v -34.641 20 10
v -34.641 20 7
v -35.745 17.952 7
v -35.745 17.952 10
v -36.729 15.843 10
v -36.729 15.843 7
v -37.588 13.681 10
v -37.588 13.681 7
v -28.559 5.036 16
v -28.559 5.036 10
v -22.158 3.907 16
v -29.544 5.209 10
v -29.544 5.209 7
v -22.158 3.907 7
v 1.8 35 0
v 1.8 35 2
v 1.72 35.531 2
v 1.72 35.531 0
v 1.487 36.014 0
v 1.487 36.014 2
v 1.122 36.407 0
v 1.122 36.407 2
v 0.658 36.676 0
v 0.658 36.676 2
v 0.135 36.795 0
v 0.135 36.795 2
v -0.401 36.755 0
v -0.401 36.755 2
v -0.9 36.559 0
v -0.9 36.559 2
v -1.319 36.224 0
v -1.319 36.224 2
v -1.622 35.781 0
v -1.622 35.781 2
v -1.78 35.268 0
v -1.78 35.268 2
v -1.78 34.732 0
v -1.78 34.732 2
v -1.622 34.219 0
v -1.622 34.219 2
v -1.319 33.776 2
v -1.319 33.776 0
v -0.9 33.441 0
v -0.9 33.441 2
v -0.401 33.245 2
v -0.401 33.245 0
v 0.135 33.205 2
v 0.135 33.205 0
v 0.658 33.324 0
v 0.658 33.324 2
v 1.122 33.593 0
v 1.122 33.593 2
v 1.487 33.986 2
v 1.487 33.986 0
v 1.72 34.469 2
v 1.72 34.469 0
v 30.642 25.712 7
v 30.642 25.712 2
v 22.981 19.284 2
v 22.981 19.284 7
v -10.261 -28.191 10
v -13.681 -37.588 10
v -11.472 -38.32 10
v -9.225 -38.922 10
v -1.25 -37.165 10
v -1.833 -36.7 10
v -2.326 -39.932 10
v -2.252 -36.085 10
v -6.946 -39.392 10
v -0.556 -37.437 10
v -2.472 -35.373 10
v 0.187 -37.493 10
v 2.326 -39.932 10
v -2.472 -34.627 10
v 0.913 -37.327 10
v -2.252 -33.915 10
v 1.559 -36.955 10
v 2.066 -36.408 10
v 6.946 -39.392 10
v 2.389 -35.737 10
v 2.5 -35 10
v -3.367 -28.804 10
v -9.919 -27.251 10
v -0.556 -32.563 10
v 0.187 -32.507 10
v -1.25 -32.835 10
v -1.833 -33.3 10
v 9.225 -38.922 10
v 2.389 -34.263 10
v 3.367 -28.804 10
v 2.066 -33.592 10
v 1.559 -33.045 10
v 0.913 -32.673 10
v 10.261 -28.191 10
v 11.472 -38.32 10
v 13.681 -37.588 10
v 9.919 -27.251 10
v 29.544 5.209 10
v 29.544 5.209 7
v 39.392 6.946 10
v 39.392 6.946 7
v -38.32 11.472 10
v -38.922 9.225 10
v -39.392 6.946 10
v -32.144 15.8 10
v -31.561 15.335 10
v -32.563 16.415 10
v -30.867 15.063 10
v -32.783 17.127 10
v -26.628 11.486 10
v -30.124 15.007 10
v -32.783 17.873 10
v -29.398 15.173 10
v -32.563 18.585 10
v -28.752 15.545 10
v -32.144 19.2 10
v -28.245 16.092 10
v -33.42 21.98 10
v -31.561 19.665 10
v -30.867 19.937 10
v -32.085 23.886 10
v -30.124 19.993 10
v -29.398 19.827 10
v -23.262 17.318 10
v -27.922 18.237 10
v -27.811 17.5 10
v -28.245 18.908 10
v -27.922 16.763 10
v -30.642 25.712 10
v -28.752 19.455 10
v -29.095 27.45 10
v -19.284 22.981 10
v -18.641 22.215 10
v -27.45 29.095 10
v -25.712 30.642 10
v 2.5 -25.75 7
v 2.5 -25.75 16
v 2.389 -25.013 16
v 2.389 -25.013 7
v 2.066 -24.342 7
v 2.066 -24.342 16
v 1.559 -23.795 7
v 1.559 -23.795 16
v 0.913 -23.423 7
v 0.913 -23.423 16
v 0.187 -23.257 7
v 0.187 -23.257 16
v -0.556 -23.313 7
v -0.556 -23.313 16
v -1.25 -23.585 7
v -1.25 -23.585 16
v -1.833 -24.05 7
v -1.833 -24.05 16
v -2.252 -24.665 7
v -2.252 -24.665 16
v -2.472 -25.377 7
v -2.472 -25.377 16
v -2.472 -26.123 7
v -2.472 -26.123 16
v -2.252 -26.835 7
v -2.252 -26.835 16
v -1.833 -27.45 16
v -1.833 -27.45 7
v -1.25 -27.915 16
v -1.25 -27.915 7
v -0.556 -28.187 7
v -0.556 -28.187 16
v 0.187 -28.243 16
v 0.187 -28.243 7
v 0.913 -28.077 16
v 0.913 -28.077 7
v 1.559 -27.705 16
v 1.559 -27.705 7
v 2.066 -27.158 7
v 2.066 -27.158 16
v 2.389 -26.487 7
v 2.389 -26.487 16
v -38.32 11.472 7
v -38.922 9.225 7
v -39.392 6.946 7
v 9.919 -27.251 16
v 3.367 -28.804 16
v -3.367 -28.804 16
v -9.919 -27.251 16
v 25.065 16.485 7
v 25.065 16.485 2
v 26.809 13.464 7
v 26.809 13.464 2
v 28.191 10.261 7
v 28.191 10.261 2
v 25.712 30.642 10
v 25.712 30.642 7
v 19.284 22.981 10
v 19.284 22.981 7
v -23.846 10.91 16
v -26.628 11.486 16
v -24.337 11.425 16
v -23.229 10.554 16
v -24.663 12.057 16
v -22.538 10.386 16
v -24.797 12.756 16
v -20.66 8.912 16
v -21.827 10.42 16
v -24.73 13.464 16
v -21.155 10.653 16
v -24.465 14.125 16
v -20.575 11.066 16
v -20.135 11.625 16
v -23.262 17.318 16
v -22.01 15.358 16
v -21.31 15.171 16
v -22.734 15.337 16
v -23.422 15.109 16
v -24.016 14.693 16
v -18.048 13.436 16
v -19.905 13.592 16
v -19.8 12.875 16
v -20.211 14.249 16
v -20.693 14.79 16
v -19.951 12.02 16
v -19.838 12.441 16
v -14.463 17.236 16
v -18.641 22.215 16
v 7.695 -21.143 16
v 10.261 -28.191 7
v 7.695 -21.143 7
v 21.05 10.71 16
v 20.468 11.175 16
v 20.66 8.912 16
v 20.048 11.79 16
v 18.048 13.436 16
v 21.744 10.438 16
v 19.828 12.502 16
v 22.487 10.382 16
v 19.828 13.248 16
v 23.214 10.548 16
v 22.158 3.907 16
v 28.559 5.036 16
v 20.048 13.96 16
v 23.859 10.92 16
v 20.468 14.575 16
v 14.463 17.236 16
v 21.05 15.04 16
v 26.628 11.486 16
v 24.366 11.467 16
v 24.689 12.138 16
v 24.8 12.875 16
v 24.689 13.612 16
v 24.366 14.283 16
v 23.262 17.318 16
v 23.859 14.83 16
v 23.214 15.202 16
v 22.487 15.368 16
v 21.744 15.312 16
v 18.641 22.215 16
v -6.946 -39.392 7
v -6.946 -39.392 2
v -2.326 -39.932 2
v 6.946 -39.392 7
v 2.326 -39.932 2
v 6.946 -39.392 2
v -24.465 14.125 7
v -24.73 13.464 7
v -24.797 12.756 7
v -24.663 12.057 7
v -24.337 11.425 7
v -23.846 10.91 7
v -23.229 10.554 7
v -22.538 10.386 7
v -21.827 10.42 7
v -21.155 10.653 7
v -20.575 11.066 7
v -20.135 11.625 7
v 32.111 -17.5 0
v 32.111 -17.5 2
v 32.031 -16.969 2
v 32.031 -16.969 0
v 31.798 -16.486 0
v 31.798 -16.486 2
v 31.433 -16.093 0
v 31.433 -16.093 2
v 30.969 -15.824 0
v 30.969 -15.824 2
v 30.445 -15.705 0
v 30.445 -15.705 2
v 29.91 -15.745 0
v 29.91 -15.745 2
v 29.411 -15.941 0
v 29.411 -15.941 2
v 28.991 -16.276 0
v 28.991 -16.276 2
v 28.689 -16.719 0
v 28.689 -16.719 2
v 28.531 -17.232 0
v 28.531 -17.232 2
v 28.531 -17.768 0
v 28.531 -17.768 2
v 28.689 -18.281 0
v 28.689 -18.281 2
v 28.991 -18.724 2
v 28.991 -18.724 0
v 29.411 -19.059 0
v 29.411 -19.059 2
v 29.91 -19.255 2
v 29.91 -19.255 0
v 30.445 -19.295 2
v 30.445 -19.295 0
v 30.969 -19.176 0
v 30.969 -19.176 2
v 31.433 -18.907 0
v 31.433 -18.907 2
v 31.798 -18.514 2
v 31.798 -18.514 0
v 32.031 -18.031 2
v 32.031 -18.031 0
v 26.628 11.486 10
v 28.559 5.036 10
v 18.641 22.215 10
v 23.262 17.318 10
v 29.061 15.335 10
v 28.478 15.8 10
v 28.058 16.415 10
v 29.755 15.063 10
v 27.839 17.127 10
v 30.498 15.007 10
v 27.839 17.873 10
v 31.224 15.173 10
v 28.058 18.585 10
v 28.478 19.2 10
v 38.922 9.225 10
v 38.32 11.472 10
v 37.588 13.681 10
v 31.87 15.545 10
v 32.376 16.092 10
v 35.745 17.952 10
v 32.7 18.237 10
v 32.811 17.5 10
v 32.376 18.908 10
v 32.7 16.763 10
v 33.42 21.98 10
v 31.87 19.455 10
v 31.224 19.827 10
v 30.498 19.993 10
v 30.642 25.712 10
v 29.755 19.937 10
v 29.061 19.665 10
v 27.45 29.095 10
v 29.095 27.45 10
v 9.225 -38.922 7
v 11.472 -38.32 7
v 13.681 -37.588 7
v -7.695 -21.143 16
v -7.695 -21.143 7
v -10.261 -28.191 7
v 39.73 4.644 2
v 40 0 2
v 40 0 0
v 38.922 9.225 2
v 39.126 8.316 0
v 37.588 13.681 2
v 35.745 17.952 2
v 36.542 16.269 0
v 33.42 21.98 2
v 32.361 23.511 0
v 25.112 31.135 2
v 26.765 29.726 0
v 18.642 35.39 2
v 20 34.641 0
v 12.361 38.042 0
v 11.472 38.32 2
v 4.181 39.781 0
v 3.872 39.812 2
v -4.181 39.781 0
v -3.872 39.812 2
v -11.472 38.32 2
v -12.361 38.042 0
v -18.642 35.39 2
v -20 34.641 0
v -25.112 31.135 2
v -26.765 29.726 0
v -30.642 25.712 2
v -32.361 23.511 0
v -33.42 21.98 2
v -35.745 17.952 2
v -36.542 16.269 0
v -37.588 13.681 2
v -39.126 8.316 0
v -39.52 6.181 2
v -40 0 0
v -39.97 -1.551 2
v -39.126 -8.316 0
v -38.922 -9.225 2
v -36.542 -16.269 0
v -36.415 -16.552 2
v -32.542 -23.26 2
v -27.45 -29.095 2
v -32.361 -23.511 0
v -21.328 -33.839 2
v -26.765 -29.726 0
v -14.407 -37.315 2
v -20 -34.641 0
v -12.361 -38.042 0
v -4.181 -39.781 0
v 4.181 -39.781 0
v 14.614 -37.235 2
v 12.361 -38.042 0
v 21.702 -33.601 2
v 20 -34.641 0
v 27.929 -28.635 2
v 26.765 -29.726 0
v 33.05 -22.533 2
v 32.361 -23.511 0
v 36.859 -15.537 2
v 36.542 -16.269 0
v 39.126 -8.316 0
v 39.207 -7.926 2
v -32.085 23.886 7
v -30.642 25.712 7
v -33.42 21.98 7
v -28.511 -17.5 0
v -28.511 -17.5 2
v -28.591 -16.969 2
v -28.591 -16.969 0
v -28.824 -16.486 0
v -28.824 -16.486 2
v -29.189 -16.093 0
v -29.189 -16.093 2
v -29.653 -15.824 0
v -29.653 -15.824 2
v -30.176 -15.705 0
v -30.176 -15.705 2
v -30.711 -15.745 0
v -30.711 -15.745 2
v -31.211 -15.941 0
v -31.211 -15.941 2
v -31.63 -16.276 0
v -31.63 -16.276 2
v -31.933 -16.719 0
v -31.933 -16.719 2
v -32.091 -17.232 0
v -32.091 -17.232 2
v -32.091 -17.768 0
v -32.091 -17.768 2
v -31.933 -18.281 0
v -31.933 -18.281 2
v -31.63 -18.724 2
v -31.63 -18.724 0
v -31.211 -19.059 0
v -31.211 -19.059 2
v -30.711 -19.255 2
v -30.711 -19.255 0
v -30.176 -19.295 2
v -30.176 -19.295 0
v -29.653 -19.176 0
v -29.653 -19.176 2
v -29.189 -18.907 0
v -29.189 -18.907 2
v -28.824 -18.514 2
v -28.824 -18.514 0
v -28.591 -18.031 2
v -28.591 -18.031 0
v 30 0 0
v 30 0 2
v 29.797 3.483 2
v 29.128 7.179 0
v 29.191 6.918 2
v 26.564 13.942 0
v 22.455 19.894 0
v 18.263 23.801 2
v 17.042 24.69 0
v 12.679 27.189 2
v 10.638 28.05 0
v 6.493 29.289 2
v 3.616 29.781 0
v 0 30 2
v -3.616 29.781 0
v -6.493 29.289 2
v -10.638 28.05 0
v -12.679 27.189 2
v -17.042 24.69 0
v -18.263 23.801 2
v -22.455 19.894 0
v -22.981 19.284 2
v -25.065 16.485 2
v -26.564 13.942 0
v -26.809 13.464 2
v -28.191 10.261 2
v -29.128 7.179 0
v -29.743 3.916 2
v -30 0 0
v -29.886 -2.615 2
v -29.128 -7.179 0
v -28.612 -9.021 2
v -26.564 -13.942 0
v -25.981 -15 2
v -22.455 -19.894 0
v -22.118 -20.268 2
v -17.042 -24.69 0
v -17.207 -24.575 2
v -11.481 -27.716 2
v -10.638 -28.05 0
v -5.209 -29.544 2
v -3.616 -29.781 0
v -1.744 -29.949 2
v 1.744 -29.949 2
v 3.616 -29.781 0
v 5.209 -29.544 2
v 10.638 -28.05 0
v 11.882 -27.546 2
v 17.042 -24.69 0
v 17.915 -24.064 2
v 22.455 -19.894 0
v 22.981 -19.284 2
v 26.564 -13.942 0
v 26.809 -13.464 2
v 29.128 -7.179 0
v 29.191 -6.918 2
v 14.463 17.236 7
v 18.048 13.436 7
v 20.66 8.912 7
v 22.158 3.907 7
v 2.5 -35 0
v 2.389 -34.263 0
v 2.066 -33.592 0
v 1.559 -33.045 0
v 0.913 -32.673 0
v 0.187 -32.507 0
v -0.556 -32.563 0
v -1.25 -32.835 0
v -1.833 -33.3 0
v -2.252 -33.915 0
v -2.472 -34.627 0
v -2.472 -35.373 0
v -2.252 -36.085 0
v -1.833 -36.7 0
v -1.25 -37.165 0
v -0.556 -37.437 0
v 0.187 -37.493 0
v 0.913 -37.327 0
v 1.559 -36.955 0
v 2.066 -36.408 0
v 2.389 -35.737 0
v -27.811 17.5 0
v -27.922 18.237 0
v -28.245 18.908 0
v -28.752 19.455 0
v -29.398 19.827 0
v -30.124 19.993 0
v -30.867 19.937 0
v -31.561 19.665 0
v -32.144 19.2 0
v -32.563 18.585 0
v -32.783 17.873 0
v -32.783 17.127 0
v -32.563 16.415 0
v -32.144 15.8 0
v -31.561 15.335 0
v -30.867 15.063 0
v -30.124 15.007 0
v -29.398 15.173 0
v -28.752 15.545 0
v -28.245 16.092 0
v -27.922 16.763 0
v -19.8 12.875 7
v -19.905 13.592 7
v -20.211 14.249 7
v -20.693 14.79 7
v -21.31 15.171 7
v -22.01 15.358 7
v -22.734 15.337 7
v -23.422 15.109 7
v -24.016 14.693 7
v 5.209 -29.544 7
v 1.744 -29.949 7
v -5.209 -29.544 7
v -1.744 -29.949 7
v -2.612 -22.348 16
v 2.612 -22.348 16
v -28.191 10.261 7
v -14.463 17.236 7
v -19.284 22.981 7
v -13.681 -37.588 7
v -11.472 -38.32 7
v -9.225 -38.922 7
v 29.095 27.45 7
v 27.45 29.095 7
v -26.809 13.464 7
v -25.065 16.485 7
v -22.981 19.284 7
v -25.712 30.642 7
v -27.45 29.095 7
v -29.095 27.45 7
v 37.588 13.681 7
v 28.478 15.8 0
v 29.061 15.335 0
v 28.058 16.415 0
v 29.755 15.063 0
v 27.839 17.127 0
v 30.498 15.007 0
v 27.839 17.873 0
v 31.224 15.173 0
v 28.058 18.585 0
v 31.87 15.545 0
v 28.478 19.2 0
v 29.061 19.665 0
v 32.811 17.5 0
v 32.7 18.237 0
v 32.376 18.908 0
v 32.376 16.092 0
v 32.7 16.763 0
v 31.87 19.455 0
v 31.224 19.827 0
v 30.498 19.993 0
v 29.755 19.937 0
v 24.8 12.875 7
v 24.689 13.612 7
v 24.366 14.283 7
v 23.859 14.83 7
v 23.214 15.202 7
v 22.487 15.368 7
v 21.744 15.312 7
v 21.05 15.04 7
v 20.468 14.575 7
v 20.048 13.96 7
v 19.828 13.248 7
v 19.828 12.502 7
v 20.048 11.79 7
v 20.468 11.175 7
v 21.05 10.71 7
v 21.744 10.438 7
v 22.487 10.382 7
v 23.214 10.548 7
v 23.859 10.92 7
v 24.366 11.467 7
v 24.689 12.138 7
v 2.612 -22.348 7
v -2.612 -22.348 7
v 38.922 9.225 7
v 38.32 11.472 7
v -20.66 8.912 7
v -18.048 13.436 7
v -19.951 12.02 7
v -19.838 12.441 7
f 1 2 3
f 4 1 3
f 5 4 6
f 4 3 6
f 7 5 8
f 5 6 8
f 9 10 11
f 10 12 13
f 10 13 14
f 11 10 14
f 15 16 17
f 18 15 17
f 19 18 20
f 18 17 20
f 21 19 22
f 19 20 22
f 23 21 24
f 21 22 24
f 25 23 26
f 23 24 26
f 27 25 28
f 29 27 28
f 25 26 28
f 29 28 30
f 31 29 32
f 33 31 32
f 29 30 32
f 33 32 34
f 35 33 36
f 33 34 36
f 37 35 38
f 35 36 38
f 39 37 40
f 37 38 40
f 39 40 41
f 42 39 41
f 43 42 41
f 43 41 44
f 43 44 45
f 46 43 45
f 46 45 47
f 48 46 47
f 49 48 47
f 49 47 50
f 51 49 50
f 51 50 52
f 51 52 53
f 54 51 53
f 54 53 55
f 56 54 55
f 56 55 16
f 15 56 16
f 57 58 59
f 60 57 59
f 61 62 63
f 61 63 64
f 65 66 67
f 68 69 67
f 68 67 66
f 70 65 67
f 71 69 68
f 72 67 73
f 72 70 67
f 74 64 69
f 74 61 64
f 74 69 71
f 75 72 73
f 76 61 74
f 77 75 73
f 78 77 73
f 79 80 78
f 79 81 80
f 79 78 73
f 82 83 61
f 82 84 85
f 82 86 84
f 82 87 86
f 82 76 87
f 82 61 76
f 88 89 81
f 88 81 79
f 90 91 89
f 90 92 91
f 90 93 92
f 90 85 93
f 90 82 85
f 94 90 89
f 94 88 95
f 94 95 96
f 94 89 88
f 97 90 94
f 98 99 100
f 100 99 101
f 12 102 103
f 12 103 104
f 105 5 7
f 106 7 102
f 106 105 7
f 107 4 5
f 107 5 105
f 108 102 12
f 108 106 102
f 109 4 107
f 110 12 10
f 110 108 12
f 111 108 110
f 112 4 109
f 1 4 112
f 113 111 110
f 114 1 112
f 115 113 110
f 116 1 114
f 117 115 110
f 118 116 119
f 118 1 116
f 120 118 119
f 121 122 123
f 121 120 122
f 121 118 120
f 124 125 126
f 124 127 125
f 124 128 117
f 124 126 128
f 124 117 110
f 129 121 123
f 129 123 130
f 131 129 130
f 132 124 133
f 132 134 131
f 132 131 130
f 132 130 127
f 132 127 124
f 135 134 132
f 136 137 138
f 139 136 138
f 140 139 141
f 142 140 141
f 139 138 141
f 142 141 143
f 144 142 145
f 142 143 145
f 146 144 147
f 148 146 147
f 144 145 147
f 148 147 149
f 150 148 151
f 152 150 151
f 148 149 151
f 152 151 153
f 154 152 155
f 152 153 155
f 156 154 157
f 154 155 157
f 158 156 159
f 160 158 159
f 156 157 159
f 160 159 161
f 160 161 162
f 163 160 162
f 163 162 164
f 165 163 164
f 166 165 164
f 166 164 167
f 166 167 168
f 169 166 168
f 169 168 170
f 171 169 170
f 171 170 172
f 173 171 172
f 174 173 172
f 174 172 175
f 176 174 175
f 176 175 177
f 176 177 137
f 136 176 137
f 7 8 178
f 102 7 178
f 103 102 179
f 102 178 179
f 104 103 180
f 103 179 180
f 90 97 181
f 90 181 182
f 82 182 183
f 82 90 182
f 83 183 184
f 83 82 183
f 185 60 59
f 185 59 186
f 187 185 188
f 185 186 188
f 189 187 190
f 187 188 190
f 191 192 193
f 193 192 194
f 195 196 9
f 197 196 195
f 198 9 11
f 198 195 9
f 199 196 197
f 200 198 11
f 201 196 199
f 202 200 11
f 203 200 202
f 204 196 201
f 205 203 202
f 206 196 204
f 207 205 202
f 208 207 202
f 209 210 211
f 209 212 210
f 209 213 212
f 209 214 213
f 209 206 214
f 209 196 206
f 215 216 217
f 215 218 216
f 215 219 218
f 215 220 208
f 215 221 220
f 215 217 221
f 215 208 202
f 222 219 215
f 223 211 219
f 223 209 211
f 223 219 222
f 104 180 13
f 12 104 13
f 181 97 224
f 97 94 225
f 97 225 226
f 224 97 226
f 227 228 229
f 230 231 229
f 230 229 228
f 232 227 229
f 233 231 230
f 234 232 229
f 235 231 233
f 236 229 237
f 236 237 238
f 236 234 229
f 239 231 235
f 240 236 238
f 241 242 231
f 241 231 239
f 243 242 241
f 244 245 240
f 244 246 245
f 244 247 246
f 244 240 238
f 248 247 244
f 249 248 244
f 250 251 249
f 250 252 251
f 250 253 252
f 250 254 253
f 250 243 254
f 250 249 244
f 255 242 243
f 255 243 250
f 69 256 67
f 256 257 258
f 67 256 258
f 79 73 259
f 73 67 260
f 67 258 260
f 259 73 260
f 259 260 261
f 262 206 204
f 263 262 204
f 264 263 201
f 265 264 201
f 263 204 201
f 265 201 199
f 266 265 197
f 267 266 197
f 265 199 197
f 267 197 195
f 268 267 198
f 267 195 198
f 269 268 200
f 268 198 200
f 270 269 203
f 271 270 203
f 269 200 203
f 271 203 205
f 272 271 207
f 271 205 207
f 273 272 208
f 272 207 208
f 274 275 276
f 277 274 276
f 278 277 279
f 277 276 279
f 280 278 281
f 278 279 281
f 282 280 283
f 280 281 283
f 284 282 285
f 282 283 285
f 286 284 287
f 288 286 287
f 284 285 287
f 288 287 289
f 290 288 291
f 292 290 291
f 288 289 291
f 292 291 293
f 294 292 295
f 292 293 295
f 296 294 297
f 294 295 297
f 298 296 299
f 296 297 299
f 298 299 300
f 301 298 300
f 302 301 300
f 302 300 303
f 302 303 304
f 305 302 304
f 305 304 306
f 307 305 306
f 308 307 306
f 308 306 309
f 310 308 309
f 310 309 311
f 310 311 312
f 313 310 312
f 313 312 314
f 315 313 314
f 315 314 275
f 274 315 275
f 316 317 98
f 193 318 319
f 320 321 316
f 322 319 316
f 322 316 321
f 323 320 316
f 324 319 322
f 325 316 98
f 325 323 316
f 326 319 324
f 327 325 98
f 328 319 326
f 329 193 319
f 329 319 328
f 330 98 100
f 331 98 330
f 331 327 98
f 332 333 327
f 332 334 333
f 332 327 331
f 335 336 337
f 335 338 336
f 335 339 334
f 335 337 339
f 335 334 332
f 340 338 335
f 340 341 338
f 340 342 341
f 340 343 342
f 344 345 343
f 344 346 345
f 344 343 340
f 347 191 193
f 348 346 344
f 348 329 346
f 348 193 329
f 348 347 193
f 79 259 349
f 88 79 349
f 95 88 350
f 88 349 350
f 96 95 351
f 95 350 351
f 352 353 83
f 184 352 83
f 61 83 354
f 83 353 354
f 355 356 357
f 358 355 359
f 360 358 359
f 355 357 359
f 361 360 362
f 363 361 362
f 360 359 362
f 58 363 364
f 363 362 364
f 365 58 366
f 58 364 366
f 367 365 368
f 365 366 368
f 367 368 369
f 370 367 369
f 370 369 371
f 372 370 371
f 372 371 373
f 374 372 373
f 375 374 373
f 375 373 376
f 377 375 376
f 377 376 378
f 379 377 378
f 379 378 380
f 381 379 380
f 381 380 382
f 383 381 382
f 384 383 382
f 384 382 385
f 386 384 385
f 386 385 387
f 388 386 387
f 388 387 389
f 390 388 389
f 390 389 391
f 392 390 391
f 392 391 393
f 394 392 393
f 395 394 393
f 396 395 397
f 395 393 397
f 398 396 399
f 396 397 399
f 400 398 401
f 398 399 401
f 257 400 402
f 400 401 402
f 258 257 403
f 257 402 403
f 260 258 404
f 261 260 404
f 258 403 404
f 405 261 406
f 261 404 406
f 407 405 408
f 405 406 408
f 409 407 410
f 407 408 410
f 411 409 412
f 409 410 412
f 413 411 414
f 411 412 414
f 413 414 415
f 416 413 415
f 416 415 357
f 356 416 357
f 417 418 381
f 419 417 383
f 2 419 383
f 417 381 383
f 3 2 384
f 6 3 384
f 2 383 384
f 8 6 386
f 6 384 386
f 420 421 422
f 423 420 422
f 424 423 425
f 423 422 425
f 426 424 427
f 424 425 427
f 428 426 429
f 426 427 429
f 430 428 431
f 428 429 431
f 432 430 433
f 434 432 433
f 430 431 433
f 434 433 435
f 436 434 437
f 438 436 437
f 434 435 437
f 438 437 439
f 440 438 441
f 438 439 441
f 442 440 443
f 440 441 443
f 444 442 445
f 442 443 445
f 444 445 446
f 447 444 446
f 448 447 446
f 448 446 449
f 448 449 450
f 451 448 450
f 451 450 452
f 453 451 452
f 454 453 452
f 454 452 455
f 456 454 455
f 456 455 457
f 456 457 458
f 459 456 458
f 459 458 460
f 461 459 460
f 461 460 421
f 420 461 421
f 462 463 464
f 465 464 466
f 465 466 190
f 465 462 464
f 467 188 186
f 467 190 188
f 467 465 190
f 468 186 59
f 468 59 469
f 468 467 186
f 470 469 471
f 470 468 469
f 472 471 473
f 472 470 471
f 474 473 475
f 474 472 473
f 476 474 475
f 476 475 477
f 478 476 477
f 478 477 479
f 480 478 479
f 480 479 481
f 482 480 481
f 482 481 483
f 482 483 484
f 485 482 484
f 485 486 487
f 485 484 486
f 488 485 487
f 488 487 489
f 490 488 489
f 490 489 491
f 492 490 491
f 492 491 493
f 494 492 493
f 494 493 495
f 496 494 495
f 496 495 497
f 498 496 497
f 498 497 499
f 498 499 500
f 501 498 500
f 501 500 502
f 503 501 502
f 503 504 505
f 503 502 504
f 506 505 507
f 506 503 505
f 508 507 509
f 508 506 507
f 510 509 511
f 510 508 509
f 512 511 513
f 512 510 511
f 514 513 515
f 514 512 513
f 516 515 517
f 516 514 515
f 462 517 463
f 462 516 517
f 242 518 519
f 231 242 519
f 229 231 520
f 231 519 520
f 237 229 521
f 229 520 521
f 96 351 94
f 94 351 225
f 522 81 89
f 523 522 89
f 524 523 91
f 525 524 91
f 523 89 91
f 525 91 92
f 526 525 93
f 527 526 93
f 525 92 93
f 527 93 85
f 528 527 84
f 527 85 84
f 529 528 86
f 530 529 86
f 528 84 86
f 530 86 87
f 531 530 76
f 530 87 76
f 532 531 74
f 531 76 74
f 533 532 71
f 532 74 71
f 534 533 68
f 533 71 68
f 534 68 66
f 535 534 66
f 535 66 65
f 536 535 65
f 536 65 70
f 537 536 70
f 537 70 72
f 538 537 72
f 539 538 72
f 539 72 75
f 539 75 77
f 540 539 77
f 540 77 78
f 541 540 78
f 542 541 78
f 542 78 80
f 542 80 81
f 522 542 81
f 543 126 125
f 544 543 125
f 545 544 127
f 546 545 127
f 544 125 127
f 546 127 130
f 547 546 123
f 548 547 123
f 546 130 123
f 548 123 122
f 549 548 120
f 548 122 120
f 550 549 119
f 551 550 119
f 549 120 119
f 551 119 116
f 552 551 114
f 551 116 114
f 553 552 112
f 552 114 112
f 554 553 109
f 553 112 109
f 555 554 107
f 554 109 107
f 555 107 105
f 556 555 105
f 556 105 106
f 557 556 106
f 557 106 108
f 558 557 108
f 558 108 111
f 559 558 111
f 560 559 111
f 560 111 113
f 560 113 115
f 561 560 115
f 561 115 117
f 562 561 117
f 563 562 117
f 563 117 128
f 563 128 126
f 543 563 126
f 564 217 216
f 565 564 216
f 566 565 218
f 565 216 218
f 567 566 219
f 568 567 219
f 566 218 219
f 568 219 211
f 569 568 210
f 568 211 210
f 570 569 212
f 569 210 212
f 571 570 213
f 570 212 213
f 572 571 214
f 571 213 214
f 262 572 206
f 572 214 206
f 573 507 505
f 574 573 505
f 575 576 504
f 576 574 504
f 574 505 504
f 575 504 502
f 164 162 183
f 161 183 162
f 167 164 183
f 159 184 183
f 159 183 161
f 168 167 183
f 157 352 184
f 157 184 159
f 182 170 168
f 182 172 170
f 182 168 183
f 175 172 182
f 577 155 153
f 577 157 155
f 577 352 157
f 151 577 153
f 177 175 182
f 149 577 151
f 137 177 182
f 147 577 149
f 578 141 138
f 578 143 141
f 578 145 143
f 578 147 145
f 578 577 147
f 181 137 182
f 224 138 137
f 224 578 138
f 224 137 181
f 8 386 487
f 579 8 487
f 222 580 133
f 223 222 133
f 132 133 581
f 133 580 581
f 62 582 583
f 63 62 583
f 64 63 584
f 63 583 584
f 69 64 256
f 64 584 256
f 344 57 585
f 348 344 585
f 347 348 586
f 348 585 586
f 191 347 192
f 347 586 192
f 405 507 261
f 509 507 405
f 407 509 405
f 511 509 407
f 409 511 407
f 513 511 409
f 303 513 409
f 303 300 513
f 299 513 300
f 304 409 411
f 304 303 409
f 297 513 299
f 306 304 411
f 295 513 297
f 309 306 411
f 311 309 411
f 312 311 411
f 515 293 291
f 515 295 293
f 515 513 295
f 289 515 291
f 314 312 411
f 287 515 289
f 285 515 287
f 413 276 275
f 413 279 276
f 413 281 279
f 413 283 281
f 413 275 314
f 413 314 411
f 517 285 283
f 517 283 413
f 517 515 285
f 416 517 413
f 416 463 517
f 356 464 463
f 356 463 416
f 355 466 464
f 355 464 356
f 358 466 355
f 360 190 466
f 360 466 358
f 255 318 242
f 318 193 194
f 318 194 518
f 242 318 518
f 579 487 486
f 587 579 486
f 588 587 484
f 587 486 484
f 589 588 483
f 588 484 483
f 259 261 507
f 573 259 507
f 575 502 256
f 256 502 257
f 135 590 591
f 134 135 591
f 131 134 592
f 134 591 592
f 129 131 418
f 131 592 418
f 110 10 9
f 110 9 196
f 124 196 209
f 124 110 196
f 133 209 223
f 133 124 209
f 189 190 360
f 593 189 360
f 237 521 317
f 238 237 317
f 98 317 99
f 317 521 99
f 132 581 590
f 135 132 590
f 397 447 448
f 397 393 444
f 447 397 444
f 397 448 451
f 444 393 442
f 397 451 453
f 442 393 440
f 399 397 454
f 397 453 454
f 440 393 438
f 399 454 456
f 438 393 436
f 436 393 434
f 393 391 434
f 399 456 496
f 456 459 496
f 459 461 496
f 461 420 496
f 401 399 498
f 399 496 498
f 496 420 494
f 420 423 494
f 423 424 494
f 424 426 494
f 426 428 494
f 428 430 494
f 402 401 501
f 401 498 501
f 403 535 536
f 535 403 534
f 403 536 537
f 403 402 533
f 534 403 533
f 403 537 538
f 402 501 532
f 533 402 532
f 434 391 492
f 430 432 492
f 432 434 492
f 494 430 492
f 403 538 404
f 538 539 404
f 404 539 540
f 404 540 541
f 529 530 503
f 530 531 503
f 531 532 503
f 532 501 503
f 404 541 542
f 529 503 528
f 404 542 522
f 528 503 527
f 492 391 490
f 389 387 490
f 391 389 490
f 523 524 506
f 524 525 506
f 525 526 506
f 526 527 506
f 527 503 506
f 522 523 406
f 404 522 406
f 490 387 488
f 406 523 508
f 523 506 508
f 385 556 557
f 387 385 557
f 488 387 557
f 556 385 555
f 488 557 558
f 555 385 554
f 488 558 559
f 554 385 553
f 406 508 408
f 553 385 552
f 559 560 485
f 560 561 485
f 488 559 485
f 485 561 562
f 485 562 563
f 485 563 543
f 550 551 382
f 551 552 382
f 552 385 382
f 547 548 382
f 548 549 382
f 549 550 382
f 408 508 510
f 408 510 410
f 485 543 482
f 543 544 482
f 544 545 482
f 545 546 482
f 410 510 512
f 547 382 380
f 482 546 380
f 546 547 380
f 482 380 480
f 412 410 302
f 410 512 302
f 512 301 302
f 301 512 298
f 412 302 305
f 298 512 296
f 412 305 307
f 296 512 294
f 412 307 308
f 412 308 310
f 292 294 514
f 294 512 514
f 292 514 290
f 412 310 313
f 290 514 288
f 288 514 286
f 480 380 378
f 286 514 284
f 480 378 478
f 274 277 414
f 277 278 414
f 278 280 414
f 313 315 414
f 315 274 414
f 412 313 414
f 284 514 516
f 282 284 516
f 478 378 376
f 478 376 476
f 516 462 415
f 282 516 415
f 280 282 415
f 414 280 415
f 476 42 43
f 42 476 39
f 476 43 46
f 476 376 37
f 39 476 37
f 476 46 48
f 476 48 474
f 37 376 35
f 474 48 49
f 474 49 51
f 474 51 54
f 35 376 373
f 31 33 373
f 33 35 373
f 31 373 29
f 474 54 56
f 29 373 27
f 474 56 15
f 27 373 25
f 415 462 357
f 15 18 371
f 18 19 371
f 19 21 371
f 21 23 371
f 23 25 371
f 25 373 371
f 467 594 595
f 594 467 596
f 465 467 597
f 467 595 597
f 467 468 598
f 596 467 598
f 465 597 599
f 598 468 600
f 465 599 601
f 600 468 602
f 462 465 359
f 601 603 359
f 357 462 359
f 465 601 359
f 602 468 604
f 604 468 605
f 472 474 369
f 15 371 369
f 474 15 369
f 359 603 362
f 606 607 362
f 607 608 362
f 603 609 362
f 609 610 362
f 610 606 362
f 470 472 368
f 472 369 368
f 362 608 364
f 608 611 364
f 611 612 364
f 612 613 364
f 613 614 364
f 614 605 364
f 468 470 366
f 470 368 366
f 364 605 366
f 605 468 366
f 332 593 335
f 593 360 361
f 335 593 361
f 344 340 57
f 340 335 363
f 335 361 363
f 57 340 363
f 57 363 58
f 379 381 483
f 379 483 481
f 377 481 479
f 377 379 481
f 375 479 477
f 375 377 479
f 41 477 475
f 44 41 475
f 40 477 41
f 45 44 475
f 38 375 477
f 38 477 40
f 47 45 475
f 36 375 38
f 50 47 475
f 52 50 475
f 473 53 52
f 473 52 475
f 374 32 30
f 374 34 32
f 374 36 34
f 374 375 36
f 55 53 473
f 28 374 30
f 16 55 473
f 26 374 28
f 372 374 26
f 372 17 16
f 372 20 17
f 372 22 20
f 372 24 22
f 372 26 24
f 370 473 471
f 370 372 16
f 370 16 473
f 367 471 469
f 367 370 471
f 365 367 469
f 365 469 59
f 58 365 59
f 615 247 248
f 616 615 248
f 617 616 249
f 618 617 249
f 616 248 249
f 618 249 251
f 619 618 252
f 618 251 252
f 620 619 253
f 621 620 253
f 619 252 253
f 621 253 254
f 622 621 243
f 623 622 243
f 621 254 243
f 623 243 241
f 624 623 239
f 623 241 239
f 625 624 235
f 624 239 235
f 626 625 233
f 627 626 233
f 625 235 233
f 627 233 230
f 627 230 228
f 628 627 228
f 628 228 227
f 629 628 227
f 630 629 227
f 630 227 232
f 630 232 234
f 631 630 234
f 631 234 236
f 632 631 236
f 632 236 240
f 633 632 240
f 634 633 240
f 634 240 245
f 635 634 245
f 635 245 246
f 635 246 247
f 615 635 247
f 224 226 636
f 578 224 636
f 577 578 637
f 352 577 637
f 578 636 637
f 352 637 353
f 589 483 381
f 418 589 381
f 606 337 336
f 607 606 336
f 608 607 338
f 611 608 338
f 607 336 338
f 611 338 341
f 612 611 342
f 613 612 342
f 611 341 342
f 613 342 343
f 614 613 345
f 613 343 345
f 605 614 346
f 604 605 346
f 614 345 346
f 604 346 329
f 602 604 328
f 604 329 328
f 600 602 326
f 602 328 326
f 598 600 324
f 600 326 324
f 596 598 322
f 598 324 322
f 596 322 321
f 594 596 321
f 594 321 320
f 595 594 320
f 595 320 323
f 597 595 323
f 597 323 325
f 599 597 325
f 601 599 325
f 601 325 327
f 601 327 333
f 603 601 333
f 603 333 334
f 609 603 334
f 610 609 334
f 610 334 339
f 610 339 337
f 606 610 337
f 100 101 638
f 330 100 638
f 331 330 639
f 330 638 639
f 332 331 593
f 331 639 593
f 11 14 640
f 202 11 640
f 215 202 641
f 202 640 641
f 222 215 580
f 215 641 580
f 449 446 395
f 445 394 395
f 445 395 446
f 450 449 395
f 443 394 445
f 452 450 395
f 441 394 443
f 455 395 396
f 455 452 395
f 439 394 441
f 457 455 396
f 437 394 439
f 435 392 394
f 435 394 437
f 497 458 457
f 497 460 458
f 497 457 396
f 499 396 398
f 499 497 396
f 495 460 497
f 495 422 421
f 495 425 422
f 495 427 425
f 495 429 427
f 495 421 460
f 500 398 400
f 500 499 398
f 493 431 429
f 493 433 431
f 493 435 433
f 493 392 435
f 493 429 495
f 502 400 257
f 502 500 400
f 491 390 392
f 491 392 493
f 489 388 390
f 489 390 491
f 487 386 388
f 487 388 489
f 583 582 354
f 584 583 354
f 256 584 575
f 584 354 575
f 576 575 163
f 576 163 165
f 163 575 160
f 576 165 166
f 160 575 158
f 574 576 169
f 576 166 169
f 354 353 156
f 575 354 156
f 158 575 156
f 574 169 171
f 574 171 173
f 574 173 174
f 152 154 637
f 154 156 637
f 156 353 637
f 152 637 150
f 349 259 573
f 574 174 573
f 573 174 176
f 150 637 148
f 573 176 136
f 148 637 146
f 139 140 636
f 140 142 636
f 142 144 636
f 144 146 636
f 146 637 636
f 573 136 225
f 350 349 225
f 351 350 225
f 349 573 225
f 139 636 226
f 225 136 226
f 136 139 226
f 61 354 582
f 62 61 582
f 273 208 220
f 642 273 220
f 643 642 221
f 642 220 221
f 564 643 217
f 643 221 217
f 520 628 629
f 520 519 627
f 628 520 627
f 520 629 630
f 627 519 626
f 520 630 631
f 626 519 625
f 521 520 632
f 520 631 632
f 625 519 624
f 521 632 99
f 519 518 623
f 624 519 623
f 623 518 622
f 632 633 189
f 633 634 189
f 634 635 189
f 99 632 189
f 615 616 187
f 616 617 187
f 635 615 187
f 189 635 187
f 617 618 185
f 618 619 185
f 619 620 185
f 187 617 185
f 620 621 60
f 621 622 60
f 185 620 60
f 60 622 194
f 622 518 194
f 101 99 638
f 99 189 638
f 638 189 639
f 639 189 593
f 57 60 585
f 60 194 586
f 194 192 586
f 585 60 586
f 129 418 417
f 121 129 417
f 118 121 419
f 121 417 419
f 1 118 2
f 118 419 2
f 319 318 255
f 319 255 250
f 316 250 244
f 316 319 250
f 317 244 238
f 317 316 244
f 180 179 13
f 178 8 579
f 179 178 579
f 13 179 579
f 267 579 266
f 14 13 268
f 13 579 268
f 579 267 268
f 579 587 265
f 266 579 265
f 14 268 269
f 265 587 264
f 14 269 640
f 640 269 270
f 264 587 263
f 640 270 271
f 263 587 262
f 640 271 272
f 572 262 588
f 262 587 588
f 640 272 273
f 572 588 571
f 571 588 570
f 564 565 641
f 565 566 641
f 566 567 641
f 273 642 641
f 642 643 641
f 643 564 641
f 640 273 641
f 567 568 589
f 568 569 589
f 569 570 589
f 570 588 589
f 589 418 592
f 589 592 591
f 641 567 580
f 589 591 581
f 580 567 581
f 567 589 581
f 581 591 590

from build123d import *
from build123d.topology import SkipClean

# Parameters (mm, degrees)
SKETCH_1_R          = 40
SKETCH_1_R_2        = 30
EXTRUDE_1_DEPTH     = 2
CUT_EXTRUDE_1_REACH = 58.604
SKETCH_2_R          = 1.8
EXTRUDE_3_DEPTH     = 5
EXTRUDE_4_DEPTH     = 3
CUT_EXTRUDE_2_REACH = 59.446
SKETCH_5_R          = 2.5
EXTRUDE_START       = -3
EXTRUDE_5_DEPTH     = 9
CUT_EXTRUDE_START   = -6
CUT_EXTRUDE_3_DEPTH = 6
CUT_EXTRUDE_4_REACH = 60.788
SKETCH_8_R          = 2.5


with BuildPart() as part:
    # 草图1 → 凸台-拉伸1 (new body)
    with BuildSketch(Plane.XY):
        Circle(SKETCH_1_R)
        Circle(SKETCH_1_R_2, mode=Mode.SUBTRACT)
    extrude(amount=EXTRUDE_1_DEPTH)

    # 草图2 → 切除-拉伸1 (cut, up to next)
    with BuildSketch(Plane.XY.offset(2), mode=Mode.PRIVATE) as cut_extrude_1_sk1:
        with Locations((0, 35)):
            Circle(SKETCH_2_R)
    cut_extrude_1_tool1 = extrude(cut_extrude_1_sk1.sketch, amount=-CUT_EXTRUDE_1_REACH, mode=Mode.PRIVATE) & part.part
    # 草图2 → 切除-拉伸1 (cut, up to next)
    with BuildSketch(Plane.XY.offset(2), mode=Mode.PRIVATE) as cut_extrude_1_sk2:
        with Locations((30.310889132, -17.5)):
            Circle(SKETCH_2_R)
    cut_extrude_1_tool2 = extrude(cut_extrude_1_sk2.sketch, amount=-CUT_EXTRUDE_1_REACH, mode=Mode.PRIVATE) & part.part
    # 草图2 → 切除-拉伸1 (cut, up to next)
    with BuildSketch(Plane.XY.offset(2), mode=Mode.PRIVATE) as cut_extrude_1_sk3:
        with Locations((-30.310889132, -17.5)):
            Circle(SKETCH_2_R)
    cut_extrude_1_tool3 = extrude(cut_extrude_1_sk3.sketch, amount=-CUT_EXTRUDE_1_REACH, mode=Mode.PRIVATE) & part.part
    add(cut_extrude_1_tool1.solids().sort_by_distance((0, 35, 2))[0], mode=Mode.SUBTRACT)
    add(cut_extrude_1_tool2.solids().sort_by_distance((30.310889, -17.5, 2))[0], mode=Mode.SUBTRACT)
    add(cut_extrude_1_tool3.solids().sort_by_distance((-30.310889, -17.5, 2))[0], mode=Mode.SUBTRACT)

    # 草图3 → 凸台-拉伸3 (add)
    with BuildSketch(Plane.XY.offset(2)):
        with BuildLine():
            Line((30.641777725, 25.711504387), (22.981333294, 19.283628291))
            ThreePointArc((22.981333294, 19.283628291), (25.980762114, 15), (28.190778624, 10.2606043))
            Line((28.190778624, 10.2606043), (37.587704831, 13.680805733))
            ThreePointArc((37.587704831, 13.680805733), (34.641016151, 20), (30.641777725, 25.711504387))
        make_face()
        with BuildLine():
            ThreePointArc((-28.190778624, 10.2606043), (-25.980762114, 15), (-22.981333294, 19.283628291))
            Line((-22.981333294, 19.283628291), (-30.641777725, 25.711504387))
            ThreePointArc((-30.641777725, 25.711504387), (-34.641016151, 20), (-37.587704831, 13.680805733))
            Line((-37.587704831, 13.680805733), (-28.190778624, 10.2606043))
        make_face()
        with BuildLine():
            Line((6.945927107, -39.39231012), (5.20944533, -29.54423259))
            ThreePointArc((5.20944533, -29.54423259), (0, -30), (-5.20944533, -29.54423259))
            Line((-5.20944533, -29.54423259), (-6.945927107, -39.39231012))
            ThreePointArc((-6.945927107, -39.39231012), (0, -40), (6.945927107, -39.39231012))
        make_face()
    extrude(amount=EXTRUDE_3_DEPTH)

    # 草图4 → 凸台-拉伸4 (add)
    with BuildSketch(Plane.XY.offset(7)):
        with BuildLine():
            ThreePointArc((-22.981333294, 19.283628291), (-21.213203436, 21.213203436), (-19.283628291, 22.981333294))
            Line((-19.283628291, 22.981333294), (-25.711504387, 30.641777725))
            ThreePointArc((-25.711504387, 30.641777725), (-28.284271247, 28.284271247), (-30.641777725, 25.711504387))
            Line((-30.641777725, 25.711504387), (-22.981333294, 19.283628291))
        make_face()
        with BuildLine():
            ThreePointArc((-25.980762114, 15), (-24.574561329, 17.207293091), (-22.981333294, 19.283628291))
            Line((-22.981333294, 19.283628291), (-30.641777725, 25.711504387))
            ThreePointArc((-30.641777725, 25.711504387), (-32.766081772, 22.943057454), (-34.641016151, 20))
            Line((-34.641016151, 20), (-25.980762114, 15))
        make_face()
        with BuildLine():
            ThreePointArc((-28.190778624, 10.2606043), (-27.189233611, 12.678547852), (-25.980762114, 15))
            Line((-25.980762114, 15), (-34.641016151, 20))
            ThreePointArc((-34.641016151, 20), (-36.252311481, 16.90473047), (-37.587704831, 13.680805733))
            Line((-37.587704831, 13.680805733), (-28.190778624, 10.2606043))
        make_face()
        with BuildLine():
            ThreePointArc((-29.54423259, 5.20944533), (-28.977774789, 7.764571353), (-28.190778624, 10.2606043))
            Line((-28.190778624, 10.2606043), (-37.587704831, 13.680805733))
            ThreePointArc((-37.587704831, 13.680805733), (-38.637033052, 10.352761804), (-39.39231012, 6.945927107))
            Line((-39.39231012, 6.945927107), (-29.54423259, 5.20944533))
        make_face()
        with BuildLine():
            Line((25.711504387, 30.641777725), (19.283628291, 22.981333294))
            ThreePointArc((19.283628291, 22.981333294), (21.213203436, 21.213203436), (22.981333294, 19.283628291))
            ThreePointArc((22.981333294, 19.283628291), (25.980762114, 15), (28.190778624, 10.2606043))
            ThreePointArc((28.190778624, 10.2606043), (28.977774789, 7.764571353), (29.54423259, 5.20944533))
            Line((29.54423259, 5.20944533), (39.39231012, 6.945927107))
            ThreePointArc((39.39231012, 6.945927107), (38.637033052, 10.352761804), (37.587704831, 13.680805733))
            ThreePointArc((37.587704831, 13.680805733), (34.641016151, 20), (30.641777725, 25.711504387))
            ThreePointArc((30.641777725, 25.711504387), (28.284271247, 28.284271247), (25.711504387, 30.641777725))
        make_face()
        with BuildLine():
            ThreePointArc((-5.20944533, -29.54423259), (-7.764571353, -28.977774789), (-10.2606043, -28.190778624))
            Line((-10.2606043, -28.190778624), (-13.680805733, -37.587704831))
            ThreePointArc((-13.680805733, -37.587704831), (-10.352761804, -38.637033052), (-6.945927107, -39.39231012))
            ThreePointArc((-6.945927107, -39.39231012), (0, -40), (6.945927107, -39.39231012))
            ThreePointArc((6.945927107, -39.39231012), (10.352761804, -38.637033052), (13.680805733, -37.587704831))
            Line((13.680805733, -37.587704831), (10.2606043, -28.190778624))
            ThreePointArc((10.2606043, -28.190778624), (7.764571353, -28.977774789), (5.20944533, -29.54423259))
            ThreePointArc((5.20944533, -29.54423259), (0, -30), (-5.20944533, -29.54423259))
        make_face()
    extrude(amount=EXTRUDE_4_DEPTH)

    # 草图5 → 切除-拉伸2 (cut, up to next)
    with BuildSketch(Plane.XY.offset(10), mode=Mode.PRIVATE) as cut_extrude_2_sk1:
        with Locations((-30.310889132, 17.5)):
            Circle(SKETCH_5_R)
    cut_extrude_2_tool1 = extrude(cut_extrude_2_sk1.sketch, amount=-CUT_EXTRUDE_2_REACH, mode=Mode.PRIVATE) & part.part
    # 草图5 → 切除-拉伸2 (cut, up to next)
    with BuildSketch(Plane.XY.offset(10), mode=Mode.PRIVATE) as cut_extrude_2_sk2:
        with Locations((30.310889132, 17.5)):
            Circle(SKETCH_5_R)
    cut_extrude_2_tool2 = extrude(cut_extrude_2_sk2.sketch, amount=-CUT_EXTRUDE_2_REACH, mode=Mode.PRIVATE) & part.part
    # 草图5 → 切除-拉伸2 (cut, up to next)
    with BuildSketch(Plane.XY.offset(10), mode=Mode.PRIVATE) as cut_extrude_2_sk3:
        with Locations((0, -35)):
            Circle(SKETCH_5_R)
    cut_extrude_2_tool3 = extrude(cut_extrude_2_sk3.sketch, amount=-CUT_EXTRUDE_2_REACH, mode=Mode.PRIVATE) & part.part
    add(cut_extrude_2_tool1.solids().sort_by_distance((-30.310889, 17.5, 10))[0], mode=Mode.SUBTRACT)
    add(cut_extrude_2_tool2.solids().sort_by_distance((30.310889, 17.5, 10))[0], mode=Mode.SUBTRACT)
    add(cut_extrude_2_tool3.solids().sort_by_distance((0, -35, 10))[0], mode=Mode.SUBTRACT)

    # 草图6 → 凸台-拉伸5 (add)
    with SkipClean():  # the faces are left unmerged after this step: merging them gives an invalid solid
        with BuildSketch(Plane.XY.offset(10).offset(EXTRUDE_START)):
            with BuildLine():
                Line((-14.462721218, 17.23599997), (-19.283628291, 22.981333294))
                ThreePointArc((-19.283628291, 22.981333294), (-25.980762114, 15), (-29.54423259, 5.20944533))
                Line((-29.54423259, 5.20944533), (-22.158174443, 3.907083998))
                ThreePointArc((-22.158174443, 3.907083998), (-19.485571585, 11.25), (-14.462721218, 17.23599997))
            make_face()
            with BuildLine():
                Line((22.158174443, 3.907083998), (29.54423259, 5.20944533))
                ThreePointArc((29.54423259, 5.20944533), (25.980762114, 15), (19.283628291, 22.981333294))
                Line((19.283628291, 22.981333294), (14.462721218, 17.23599997))
                ThreePointArc((14.462721218, 17.23599997), (19.485571585, 11.25), (22.158174443, 3.907083998))
            make_face()
            with BuildLine():
                Line((-7.695453225, -21.143083968), (-10.2606043, -28.190778624))
                ThreePointArc((-10.2606043, -28.190778624), (0, -30), (10.2606043, -28.190778624))
                Line((10.2606043, -28.190778624), (7.695453225, -21.143083968))
                ThreePointArc((7.695453225, -21.143083968), (0, -22.5), (-7.695453225, -21.143083968))
            make_face()
        extrude(amount=EXTRUDE_5_DEPTH)

    # 草图7 → 切除-拉伸3 (cut)
    with SkipClean():  # the faces are left unmerged after this step: merging them gives an invalid solid
        with BuildSketch(Plane.XY.offset(16).offset(CUT_EXTRUDE_START)):
            with BuildLine():
                Line((-29.54423259, 5.20944533), (-28.559424837, 5.035797152))
                ThreePointArc((-28.559424837, 5.035797152), (-25.11473671, 14.5), (-18.640840681, 22.21528885))
                Line((-18.640840681, 22.21528885), (-19.283628291, 22.981333294))
                ThreePointArc((-19.283628291, 22.981333294), (-25.980762114, 15), (-29.54423259, 5.20944533))
            make_face()
            with BuildLine():
                ThreePointArc((18.640840681, 22.21528885), (25.11473671, 14.5), (28.559424837, 5.035797152))
                Line((28.559424837, 5.035797152), (29.54423259, 5.20944533))
                ThreePointArc((29.54423259, 5.20944533), (25.980762114, 15), (19.283628291, 22.981333294))
                Line((19.283628291, 22.981333294), (18.640840681, 22.21528885))
            make_face()
            with BuildLine():
                ThreePointArc((-10.2606043, -28.190778624), (0, -30), (10.2606043, -28.190778624))
                Line((10.2606043, -28.190778624), (9.918584156, -27.251086003))
                ThreePointArc((9.918584156, -27.251086003), (0, -29), (-9.918584156, -27.251086003))
                Line((-9.918584156, -27.251086003), (-10.2606043, -28.190778624))
            make_face()
        extrude(amount=CUT_EXTRUDE_3_DEPTH, mode=Mode.SUBTRACT)

    # 草图8 → 切除-拉伸4 (cut, up to next)
    with BuildSketch(Plane.XY.offset(16), mode=Mode.PRIVATE) as cut_extrude_4_sk1:
        with Locations((0, -25.75)):
            Circle(SKETCH_8_R)
    cut_extrude_4_tool1 = extrude(cut_extrude_4_sk1.sketch, amount=-CUT_EXTRUDE_4_REACH, mode=Mode.PRIVATE) & part.part
    # 草图8 → 切除-拉伸4 (cut, up to next)
    with BuildSketch(Plane.XY.offset(16), mode=Mode.PRIVATE) as cut_extrude_4_sk2:
        with Locations((22.300154147, 12.875)):
            Circle(SKETCH_8_R)
    cut_extrude_4_tool2 = extrude(cut_extrude_4_sk2.sketch, amount=-CUT_EXTRUDE_4_REACH, mode=Mode.PRIVATE) & part.part
    # 草图8 → 切除-拉伸4 (cut, up to next)
    with BuildSketch(Plane.XY.offset(16), mode=Mode.PRIVATE) as cut_extrude_4_sk3:
        with BuildLine():
            ThreePointArc((-24.465217657, 14.125), (-23.550154147, 10.709936491), (-20.135090638, 11.625))
            Line((-20.135090638, 11.625), (-24.465217657, 14.125))
        make_face()
    cut_extrude_4_tool3 = extrude(cut_extrude_4_sk3.sketch, amount=-CUT_EXTRUDE_4_REACH, mode=Mode.PRIVATE) & part.part
    # 草图8 → 切除-拉伸4 (cut, up to next)
    with BuildSketch(Plane.XY.offset(16), mode=Mode.PRIVATE) as cut_extrude_4_sk4:
        with BuildLine():
            Line((-24.465217657, 14.125), (-20.135090638, 11.625))
            ThreePointArc((-20.135090638, 11.625), (-19.885339582, 12.227952387), (-19.800154147, 12.875))
            ThreePointArc((-19.800154147, 12.875), (-21.653106535, 15.289814566), (-24.465217657, 14.125))
        make_face()
    cut_extrude_4_tool4 = extrude(cut_extrude_4_sk4.sketch, amount=-CUT_EXTRUDE_4_REACH, mode=Mode.PRIVATE) & part.part
    # 草图8 → 切除-拉伸4 (cut, up to next)
    with BuildSketch(Plane.XY.offset(16), mode=Mode.PRIVATE) as cut_extrude_4_sk5:
        with BuildLine():
            ThreePointArc((-24.465217657, 14.125), (-23.550154147, 10.709936491), (-20.135090638, 11.625))
            Line((-20.135090638, 11.625), (-24.465217657, 14.125))
        make_face()
    cut_extrude_4_tool5 = extrude(cut_extrude_4_sk5.sketch, amount=-CUT_EXTRUDE_4_REACH, mode=Mode.PRIVATE) & part.part
    # 草图8 → 切除-拉伸4 (cut, up to next)
    with BuildSketch(Plane.XY.offset(16), mode=Mode.PRIVATE) as cut_extrude_4_sk6:
        with BuildLine():
            Line((-24.465217657, 14.125), (-20.135090638, 11.625))
            ThreePointArc((-20.135090638, 11.625), (-19.885339582, 12.227952387), (-19.800154147, 12.875))
            ThreePointArc((-19.800154147, 12.875), (-21.653106535, 15.289814566), (-24.465217657, 14.125))
        make_face()
    cut_extrude_4_tool6 = extrude(cut_extrude_4_sk6.sketch, amount=-CUT_EXTRUDE_4_REACH, mode=Mode.PRIVATE) & part.part
    add(cut_extrude_4_tool1.solids().sort_by_distance((0, -25.75, 16))[0], mode=Mode.SUBTRACT)
    add(cut_extrude_4_tool2.solids().sort_by_distance((22.300154, 12.875, 16))[0], mode=Mode.SUBTRACT)
    add(cut_extrude_4_tool3.solids().sort_by_distance((-22.830671, 11.956119, 16))[0], mode=Mode.SUBTRACT)
    add(cut_extrude_4_tool4.solids().sort_by_distance((-21.769638, 13.793881, 16))[0], mode=Mode.SUBTRACT)
    add(cut_extrude_4_tool5.solids().sort_by_distance((-22.830671, 11.956119, 16))[0], mode=Mode.SUBTRACT)
    add(cut_extrude_4_tool6.solids().sort_by_distance((-21.769638, 13.793881, 16))[0], mode=Mode.SUBTRACT)


solid = part.part
